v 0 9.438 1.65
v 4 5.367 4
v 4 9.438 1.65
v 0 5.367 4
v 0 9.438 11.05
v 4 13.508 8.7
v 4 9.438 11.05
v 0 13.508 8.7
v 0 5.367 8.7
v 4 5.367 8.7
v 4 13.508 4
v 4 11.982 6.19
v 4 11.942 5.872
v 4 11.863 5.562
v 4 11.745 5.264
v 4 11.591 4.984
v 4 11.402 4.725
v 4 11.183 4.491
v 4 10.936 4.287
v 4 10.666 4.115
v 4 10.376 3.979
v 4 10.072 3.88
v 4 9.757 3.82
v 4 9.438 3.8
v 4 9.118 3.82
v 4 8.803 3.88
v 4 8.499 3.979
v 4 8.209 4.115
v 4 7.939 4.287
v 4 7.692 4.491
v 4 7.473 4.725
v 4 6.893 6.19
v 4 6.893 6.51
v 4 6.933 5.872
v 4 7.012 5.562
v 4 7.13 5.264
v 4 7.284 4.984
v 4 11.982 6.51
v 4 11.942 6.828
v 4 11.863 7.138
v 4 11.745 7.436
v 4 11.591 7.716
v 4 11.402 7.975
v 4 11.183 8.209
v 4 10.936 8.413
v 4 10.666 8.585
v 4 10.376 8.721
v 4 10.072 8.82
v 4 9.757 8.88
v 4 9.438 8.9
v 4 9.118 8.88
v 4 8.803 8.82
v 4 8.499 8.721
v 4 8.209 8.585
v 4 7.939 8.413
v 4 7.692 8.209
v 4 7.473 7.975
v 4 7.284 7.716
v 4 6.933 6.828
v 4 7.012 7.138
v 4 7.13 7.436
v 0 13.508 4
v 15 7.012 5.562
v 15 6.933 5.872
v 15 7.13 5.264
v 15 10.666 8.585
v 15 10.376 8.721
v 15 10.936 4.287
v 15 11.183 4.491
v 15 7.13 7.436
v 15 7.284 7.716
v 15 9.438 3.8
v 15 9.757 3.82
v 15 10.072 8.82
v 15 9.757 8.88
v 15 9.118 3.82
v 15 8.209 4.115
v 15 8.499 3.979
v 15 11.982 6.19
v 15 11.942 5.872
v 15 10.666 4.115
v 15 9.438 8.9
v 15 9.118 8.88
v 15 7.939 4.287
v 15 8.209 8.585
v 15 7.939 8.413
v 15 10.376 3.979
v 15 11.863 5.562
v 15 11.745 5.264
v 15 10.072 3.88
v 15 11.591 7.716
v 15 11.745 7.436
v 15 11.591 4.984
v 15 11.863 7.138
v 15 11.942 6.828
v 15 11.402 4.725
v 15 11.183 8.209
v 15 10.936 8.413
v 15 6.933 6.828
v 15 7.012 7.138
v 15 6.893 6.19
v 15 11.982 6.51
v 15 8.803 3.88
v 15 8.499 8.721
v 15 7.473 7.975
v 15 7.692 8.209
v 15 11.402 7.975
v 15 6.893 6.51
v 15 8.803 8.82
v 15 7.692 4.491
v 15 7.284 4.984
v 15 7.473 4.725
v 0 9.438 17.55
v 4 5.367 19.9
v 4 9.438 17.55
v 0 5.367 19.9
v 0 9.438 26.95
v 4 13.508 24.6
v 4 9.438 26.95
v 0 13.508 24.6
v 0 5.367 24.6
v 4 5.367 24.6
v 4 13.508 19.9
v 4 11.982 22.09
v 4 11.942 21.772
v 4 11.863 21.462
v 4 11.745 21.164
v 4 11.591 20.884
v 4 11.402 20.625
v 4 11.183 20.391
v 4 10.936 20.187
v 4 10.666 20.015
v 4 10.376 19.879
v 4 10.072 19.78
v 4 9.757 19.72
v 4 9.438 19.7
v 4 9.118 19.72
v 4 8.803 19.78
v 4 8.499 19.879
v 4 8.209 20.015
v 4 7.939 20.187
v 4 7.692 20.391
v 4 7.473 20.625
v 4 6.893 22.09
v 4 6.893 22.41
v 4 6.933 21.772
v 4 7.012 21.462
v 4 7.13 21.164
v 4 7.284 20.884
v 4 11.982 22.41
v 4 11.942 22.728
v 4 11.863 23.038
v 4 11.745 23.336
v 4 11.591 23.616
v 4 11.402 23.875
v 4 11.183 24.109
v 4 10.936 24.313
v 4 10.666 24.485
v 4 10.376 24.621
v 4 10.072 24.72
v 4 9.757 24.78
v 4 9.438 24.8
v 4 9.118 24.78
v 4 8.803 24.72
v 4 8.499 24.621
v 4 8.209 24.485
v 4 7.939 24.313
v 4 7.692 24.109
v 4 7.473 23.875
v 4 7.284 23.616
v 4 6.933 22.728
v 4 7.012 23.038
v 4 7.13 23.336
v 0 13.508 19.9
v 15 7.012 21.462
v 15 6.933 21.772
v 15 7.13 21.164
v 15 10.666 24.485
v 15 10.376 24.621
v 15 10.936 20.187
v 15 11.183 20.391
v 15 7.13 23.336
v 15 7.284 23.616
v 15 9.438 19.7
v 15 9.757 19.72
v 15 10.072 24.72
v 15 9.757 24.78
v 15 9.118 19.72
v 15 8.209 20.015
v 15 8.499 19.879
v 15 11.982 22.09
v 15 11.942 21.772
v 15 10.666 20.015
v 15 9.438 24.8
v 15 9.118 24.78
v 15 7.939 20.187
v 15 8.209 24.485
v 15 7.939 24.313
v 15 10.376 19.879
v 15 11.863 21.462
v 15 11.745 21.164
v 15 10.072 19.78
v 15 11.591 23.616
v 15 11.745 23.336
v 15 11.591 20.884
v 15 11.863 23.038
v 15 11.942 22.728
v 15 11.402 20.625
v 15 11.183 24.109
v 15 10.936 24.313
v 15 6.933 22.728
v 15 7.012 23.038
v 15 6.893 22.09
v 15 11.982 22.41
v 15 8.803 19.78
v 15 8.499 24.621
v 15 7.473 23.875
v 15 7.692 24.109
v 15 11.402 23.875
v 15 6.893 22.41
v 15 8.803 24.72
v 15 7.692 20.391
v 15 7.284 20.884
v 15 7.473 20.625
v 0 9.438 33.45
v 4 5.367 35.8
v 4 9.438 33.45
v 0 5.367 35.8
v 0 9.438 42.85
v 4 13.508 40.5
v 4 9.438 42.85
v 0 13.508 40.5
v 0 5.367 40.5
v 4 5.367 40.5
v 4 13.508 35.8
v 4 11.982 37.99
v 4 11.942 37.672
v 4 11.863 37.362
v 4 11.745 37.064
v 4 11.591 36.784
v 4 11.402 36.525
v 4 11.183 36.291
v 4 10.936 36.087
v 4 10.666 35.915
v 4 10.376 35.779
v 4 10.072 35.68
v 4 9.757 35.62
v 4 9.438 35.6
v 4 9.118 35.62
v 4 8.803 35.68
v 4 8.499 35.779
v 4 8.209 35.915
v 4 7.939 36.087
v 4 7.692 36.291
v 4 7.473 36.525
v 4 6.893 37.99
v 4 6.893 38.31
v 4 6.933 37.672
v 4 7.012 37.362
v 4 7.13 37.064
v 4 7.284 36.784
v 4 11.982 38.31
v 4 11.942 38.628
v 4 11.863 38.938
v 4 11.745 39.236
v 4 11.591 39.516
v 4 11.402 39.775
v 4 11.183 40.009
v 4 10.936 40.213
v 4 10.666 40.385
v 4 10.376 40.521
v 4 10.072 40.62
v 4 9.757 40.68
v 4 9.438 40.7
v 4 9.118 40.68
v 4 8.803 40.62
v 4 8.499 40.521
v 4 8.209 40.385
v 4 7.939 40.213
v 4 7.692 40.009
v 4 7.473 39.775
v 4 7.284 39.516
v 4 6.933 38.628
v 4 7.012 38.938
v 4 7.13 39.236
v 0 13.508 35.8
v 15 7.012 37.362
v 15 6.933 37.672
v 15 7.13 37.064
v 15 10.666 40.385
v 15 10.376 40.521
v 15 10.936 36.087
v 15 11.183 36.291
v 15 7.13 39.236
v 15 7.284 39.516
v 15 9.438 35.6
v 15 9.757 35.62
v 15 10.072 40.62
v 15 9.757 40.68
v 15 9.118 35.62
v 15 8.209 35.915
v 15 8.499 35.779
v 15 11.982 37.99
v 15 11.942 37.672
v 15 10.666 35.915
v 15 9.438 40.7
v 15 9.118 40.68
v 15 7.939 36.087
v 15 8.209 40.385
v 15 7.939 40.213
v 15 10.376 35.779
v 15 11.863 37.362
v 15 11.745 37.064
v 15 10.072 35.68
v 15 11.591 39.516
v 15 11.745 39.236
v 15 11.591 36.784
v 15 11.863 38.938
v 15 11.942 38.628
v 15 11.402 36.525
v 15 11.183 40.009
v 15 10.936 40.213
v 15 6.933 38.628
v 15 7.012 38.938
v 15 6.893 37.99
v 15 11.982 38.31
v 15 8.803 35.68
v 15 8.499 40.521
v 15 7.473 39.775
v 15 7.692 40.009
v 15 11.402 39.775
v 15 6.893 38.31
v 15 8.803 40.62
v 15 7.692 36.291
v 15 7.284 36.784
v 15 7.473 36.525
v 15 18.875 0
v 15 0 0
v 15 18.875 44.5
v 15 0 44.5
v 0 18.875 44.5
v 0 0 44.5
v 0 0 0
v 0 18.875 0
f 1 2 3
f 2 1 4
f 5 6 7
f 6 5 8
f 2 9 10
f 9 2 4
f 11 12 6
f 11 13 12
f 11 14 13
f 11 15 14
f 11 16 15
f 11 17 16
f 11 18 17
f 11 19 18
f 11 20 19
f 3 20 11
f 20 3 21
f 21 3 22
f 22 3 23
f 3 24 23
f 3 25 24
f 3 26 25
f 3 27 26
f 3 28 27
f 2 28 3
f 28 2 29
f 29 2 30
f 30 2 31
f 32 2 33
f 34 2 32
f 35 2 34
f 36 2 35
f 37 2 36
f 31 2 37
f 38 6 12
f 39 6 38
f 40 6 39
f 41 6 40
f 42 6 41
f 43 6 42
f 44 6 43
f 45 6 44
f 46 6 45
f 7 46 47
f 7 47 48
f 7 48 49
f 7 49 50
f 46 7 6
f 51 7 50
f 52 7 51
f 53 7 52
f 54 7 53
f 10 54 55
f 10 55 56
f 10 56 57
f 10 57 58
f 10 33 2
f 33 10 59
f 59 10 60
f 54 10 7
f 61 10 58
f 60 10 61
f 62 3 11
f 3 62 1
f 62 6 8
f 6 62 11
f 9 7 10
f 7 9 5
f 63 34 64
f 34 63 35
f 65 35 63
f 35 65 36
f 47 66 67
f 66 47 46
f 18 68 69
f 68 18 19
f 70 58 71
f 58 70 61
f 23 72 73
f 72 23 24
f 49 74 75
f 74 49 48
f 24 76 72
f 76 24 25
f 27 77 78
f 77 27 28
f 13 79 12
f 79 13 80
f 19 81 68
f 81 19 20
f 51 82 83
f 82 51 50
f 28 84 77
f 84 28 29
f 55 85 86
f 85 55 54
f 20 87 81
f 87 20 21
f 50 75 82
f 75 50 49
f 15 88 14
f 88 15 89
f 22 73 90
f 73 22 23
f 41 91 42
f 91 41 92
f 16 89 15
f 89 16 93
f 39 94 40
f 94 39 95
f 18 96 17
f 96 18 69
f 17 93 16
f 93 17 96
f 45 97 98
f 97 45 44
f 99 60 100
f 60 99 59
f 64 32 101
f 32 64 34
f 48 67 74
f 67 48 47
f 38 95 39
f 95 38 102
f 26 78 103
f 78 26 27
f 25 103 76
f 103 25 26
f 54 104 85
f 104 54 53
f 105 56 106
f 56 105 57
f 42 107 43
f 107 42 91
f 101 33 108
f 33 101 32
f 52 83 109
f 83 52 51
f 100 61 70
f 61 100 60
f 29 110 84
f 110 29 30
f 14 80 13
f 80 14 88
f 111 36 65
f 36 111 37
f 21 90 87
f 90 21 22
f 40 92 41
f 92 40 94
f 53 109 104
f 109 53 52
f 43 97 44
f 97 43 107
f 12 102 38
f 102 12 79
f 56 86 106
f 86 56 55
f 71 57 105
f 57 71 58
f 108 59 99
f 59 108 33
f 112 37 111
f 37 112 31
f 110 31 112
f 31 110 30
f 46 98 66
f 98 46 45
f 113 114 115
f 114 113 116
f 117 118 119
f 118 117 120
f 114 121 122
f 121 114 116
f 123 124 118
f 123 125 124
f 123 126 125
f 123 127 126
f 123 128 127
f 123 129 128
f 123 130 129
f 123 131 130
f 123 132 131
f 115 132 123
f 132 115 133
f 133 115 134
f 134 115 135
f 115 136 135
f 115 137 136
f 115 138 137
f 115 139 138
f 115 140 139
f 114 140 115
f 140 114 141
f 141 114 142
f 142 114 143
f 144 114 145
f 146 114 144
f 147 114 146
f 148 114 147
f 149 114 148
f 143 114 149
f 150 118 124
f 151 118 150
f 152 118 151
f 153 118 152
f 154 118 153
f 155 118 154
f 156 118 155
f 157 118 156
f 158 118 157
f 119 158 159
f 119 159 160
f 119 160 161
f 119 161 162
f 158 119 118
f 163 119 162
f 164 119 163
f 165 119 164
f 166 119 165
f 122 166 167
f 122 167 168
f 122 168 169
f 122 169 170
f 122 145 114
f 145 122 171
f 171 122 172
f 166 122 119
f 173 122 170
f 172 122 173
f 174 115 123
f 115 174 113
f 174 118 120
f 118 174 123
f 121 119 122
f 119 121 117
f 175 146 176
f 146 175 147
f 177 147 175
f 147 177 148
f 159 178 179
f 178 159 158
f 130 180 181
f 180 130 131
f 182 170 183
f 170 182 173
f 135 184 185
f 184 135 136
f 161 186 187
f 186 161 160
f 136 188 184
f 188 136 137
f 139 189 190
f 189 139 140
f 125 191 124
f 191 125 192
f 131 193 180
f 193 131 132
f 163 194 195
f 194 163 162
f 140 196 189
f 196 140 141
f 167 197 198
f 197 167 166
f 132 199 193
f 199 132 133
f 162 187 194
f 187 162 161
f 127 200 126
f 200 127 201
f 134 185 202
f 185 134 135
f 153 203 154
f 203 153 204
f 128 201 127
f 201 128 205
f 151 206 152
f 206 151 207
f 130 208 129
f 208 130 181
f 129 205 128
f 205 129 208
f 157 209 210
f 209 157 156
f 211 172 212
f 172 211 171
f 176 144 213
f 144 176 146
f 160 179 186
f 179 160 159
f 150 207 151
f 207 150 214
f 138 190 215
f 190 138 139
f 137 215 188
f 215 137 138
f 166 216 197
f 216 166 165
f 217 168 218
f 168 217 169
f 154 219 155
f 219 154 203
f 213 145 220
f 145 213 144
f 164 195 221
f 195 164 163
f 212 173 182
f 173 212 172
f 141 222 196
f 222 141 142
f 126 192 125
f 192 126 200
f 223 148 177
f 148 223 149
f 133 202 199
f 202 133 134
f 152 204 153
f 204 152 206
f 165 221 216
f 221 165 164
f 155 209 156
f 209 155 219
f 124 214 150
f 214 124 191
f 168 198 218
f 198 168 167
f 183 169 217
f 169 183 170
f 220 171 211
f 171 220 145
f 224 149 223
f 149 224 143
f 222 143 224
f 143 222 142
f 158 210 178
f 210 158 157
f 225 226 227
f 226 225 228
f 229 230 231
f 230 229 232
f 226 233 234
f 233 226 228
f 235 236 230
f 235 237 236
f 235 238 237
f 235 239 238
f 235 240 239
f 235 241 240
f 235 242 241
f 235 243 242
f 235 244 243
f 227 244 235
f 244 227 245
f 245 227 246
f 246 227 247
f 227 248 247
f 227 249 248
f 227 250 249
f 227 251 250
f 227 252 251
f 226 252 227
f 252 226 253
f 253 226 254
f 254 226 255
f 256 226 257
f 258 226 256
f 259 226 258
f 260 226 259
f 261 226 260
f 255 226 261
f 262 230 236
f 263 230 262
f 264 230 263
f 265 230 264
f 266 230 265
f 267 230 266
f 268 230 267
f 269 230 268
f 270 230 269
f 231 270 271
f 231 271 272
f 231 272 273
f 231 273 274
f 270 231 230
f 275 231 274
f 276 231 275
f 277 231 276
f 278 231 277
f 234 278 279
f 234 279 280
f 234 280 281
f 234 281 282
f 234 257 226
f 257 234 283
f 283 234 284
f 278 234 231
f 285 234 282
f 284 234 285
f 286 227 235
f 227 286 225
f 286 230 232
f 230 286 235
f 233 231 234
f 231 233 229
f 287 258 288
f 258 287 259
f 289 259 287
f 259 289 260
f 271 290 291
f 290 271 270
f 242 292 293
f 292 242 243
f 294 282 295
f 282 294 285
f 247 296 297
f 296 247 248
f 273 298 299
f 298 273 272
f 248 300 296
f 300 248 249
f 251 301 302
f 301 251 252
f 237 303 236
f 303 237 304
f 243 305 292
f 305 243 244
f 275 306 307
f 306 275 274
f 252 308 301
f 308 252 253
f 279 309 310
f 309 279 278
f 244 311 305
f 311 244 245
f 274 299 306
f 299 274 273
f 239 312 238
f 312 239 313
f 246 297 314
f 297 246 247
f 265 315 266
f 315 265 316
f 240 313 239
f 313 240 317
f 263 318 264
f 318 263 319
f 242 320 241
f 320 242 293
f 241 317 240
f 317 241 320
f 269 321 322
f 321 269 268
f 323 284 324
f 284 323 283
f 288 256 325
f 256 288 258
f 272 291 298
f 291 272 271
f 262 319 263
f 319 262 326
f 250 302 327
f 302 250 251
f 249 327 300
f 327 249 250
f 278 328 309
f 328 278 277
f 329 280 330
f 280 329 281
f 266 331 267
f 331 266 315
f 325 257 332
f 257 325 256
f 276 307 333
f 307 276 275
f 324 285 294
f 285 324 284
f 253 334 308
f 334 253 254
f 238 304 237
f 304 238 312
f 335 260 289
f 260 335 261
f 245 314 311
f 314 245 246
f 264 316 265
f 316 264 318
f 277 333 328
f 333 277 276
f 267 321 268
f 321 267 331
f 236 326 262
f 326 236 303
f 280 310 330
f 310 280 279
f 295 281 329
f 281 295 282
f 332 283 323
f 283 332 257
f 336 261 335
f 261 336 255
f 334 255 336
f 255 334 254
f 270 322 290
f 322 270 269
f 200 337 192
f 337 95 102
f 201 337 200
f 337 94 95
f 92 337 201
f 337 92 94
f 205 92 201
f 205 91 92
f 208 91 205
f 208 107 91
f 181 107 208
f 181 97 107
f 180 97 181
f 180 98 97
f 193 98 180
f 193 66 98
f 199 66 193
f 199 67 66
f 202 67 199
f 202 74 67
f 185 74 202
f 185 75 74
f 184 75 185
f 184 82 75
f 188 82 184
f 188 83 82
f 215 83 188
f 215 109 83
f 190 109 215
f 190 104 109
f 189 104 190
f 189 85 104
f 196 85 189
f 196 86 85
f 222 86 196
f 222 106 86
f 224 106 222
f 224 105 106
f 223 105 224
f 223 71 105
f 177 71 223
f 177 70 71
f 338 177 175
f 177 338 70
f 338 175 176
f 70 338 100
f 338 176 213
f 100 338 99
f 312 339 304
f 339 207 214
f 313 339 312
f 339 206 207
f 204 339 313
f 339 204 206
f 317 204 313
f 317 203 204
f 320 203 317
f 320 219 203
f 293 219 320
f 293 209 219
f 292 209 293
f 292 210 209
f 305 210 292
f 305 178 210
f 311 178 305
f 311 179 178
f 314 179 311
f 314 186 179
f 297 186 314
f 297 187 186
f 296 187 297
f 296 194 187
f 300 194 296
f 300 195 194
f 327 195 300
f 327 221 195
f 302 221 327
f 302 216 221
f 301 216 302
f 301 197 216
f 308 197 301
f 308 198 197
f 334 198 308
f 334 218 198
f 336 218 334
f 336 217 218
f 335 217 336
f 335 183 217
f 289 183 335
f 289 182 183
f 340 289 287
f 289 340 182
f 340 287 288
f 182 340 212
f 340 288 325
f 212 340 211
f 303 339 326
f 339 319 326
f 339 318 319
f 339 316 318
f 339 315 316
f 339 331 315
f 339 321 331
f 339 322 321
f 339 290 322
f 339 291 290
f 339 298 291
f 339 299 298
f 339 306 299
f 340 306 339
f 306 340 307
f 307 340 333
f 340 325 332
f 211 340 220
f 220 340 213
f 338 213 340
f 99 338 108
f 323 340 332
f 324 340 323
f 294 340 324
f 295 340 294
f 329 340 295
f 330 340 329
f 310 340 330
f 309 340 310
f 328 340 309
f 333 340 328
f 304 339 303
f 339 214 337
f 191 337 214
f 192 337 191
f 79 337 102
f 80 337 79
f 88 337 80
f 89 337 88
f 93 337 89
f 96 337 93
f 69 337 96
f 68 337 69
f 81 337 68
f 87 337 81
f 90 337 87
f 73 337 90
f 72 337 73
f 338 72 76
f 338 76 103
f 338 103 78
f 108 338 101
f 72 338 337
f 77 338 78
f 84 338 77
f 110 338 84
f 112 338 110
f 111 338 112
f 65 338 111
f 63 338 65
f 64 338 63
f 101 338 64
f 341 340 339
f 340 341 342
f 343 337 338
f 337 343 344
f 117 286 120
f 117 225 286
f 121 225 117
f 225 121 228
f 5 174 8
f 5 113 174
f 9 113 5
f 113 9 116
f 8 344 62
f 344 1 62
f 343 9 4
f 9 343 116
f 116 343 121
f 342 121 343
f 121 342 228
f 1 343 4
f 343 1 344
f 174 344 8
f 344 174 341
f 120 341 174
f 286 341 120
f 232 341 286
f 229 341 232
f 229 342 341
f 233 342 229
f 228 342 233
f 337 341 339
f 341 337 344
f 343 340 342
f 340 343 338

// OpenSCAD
// file: _rail.scad
include <_defaults.scad>

module m_rail_1u() {
    difference() {
        cube([
            h2sr_rail_depth_mm,
            ru_rail_width_mm,
            ru_rail_height_mm]);
        m_rail_m5_bottomThread();
        m_rail_m5_centerThread();
        m_rail_m5_topThread();
    }

    module m_rail_m5_bottomThread() {
        translate([
            0,
            ru_rail_width_mm / 2,
            ru_rail_thread_endDistance_mm])
        m_rail_m5_thread();
    }

    module m_rail_m5_centerThread() {
        translate([
            0,
            ru_rail_width_mm / 2,
            ru_rail_height_mm / 2])
        m_rail_m5_thread();
    }

    module m_rail_m5_topThread() {
        translate([
            0,
            ru_rail_width_mm / 2,
            ru_rail_height_mm - ru_rail_thread_endDistance_mm])
        m_rail_m5_thread();
    }

    module m_rail_m5_thread() {
        union() {
            translate([-0.1, 0, 0])
            rotate([0, 90, 0])
            cylinder(
                h = h2sr_m5nut_height_mm + 0.1,
                r = f_h2sr_m5nut_housing_radius_mm(),
                $fn = 6);
            translate([h2sr_m5nut_height_mm - 0.1, 0, 0])
            rotate([0, 90, 0])
            cylinder(
                h = (h2sr_rail_depth_mm - h2sr_m5nut_height_mm) + 0.2,
                r = f_h2sr_m5bolt_housing_radius_mm(),
                $fn = 50);
        }
    }
}
// file: _defaults.scad
ru_rail_width_mm = 18.875;
ru_rail_height_mm = 44.5;
ru_rail_thread_endDistance_mm = 6.35;
h2sr_rail_depth_mm = 15;
h2sr_m5bolt_housing_diameter_gain_mm = 0.1;
h2sr_m5bolt_housing_diameter_mm = 5;
h2sr_m5nut_height_mm = 4;
h2sr_m5nut_housing_diameter_gain_mm = 0.4;
h2sr_m5nut_housing_diameter_mm = 9;

function f_h2sr_m5bolt_housing_diameter_mm()
    = h2sr_m5bolt_housing_diameter_mm + h2sr_m5bolt_housing_diameter_gain_mm;
function f_h2sr_m5bolt_housing_radius_mm()
    = f_h2sr_m5bolt_housing_diameter_mm() / 2;
function f_h2sr_m5nut_housing_diameter_mm()
    = h2sr_m5nut_housing_diameter_mm + h2sr_m5nut_housing_diameter_gain_mm;
function f_h2sr_m5nut_housing_radius_mm()
    = f_h2sr_m5nut_housing_diameter_mm() / 2;
// main file
include <_defaults.scad>
include <_rail.scad>

m_rail_1u();
